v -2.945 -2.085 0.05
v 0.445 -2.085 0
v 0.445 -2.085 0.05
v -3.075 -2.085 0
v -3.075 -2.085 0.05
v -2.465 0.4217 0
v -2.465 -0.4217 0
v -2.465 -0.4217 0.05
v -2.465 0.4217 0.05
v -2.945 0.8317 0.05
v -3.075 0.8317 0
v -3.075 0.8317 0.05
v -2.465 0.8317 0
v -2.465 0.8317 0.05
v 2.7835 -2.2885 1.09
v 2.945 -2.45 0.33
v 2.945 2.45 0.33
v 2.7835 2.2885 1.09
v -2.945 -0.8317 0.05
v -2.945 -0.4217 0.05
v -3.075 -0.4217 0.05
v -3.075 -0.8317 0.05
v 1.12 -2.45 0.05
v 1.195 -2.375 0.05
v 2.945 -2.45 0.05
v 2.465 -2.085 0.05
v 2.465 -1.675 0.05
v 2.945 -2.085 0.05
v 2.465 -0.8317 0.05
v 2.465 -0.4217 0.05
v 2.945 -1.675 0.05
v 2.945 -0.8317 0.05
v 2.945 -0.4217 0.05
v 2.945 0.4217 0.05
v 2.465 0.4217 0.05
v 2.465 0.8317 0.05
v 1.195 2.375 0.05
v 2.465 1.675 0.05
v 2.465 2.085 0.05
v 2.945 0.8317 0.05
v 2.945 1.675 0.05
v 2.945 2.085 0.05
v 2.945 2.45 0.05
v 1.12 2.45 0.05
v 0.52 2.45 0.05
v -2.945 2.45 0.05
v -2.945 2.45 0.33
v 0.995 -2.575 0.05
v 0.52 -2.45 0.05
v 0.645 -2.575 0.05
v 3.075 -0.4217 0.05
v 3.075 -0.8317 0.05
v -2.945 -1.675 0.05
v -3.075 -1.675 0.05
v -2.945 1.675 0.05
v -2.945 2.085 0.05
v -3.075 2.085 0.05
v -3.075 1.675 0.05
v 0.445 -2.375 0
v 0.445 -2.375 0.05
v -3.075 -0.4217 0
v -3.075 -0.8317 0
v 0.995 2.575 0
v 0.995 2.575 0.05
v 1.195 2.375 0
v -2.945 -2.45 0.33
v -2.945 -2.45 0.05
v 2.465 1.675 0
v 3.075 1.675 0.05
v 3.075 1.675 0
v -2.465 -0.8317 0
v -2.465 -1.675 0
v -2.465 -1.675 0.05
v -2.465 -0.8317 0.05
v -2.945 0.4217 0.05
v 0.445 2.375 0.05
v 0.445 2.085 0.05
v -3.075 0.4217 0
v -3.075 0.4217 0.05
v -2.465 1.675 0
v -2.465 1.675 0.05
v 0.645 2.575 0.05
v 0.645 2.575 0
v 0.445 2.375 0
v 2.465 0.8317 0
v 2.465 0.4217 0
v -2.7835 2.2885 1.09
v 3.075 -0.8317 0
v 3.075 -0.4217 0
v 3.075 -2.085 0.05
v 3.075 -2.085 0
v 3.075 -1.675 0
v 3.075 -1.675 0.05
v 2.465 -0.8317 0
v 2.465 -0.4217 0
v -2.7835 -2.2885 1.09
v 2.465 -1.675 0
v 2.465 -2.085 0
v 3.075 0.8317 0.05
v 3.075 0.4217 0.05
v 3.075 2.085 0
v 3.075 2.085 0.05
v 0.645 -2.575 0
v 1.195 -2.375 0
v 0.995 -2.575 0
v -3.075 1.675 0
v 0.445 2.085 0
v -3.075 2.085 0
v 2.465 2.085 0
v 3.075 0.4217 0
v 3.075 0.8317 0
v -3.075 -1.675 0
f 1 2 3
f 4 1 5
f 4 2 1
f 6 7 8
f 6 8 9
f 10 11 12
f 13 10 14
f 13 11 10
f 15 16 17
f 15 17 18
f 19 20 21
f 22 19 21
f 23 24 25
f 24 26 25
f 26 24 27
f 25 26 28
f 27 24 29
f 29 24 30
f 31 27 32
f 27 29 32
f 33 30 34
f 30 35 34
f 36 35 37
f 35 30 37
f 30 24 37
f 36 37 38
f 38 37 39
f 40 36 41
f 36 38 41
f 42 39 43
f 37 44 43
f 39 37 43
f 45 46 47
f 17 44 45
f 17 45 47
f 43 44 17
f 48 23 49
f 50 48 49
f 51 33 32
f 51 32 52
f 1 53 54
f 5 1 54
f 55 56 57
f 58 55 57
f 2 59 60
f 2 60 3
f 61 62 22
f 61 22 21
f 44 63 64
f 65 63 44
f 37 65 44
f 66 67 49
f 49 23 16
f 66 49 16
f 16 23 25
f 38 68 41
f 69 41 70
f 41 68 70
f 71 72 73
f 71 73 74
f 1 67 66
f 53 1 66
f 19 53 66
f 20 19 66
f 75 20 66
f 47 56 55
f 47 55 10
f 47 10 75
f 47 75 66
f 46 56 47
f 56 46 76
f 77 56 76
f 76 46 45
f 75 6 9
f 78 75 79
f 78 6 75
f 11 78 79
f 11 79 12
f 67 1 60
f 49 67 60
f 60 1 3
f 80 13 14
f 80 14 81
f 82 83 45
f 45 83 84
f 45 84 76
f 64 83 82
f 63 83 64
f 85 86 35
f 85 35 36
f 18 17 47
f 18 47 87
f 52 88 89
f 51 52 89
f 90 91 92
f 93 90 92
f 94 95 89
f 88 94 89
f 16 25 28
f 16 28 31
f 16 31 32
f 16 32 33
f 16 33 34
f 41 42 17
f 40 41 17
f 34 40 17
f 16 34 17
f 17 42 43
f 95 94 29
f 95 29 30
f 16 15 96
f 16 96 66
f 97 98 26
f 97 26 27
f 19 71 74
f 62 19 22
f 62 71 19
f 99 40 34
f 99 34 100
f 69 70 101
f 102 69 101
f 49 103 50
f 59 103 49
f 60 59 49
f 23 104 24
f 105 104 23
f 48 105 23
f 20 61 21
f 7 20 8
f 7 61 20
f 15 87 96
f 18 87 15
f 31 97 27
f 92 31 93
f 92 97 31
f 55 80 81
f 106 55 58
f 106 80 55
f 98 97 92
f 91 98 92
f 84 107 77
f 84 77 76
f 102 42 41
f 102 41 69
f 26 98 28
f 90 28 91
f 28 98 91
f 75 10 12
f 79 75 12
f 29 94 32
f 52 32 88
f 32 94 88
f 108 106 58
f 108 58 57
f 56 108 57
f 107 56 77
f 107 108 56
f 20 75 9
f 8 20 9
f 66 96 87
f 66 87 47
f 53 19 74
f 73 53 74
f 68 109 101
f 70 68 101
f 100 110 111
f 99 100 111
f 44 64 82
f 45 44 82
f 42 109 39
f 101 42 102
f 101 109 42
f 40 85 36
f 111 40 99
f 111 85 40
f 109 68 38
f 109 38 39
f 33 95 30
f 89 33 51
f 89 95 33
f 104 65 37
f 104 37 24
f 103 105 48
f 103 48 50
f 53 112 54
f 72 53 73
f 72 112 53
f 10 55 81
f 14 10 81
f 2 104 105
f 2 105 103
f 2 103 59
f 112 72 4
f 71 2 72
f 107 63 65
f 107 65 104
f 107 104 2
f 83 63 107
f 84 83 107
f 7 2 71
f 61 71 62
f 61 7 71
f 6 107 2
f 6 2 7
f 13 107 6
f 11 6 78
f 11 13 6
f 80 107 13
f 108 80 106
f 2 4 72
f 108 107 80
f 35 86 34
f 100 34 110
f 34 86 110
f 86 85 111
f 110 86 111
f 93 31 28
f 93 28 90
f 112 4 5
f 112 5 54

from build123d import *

# Parameters (mm, degrees)
SKETCH001_W     = 5.89
SKETCH001_H     = 4.9
PAD001_DEPTH    = 1.04
POCKET_DEPTH    = 6
POCKET001_DEPTH = 6
SKETCH_W        = 0.61
SKETCH_H        = 0.41
PAD_DEPTH       = 0.05
CHAMFER004_SIZE = 0.2
CHAMFER005_SIZE = 0.2
CHAMFER006_SIZE = 0.2
CHAMFER007_SIZE = 0.2


with BuildPart() as pocket001:
    # Sketch001 → Pad001 (new body)
    with BuildSketch(Plane.XY.offset(0.05)):
        with Locations((3.075, 2.575)):
            Rectangle(SKETCH001_W, SKETCH001_H)
    extrude(amount=PAD001_DEPTH)

    # Sketch002 → Pocket (cut)
    with BuildSketch(Plane(origin=(0, 0.125, 0.05), x_dir=(1, 0, 0), z_dir=(0, -1, 0))):
        Polygon((0.13, 0.28), (0.13, 1.04), (0.291543, 1.04), align=None)
        Polygon((5.858457, 1.04), (6.02, 1.04), (6.02, 0.28), align=None)
    extrude(amount=-POCKET_DEPTH, mode=Mode.SUBTRACT)

    # Sketch003 → Pocket001 (cut)
    with BuildSketch(Plane(origin=(6.02, 0, 0.05), x_dir=(0, 1, 0), z_dir=(1, 0, 0))):
        Polygon((0.125, 0.28), (0.125, 1.04), (0.286543, 1.04), align=None)
        Polygon((4.863457, 1.04), (5.025, 1.04), (5.025, 0.28), align=None)
    extrude(amount=-POCKET001_DEPTH, mode=Mode.SUBTRACT)


with BuildPart() as fusion:
    # Sketch → Pad (new body)
    with BuildSketch(Plane.XY):
        Polygon((3.52, 0), (3.52, 0.49), (0, 0.49), (0, 0.9), (0.61, 0.9), (0.61, 1.743333), (0, 1.743333), (0, 2.153333), (0.61, 2.153333), (0.61, 2.996667), (0, 2.996667), (0, 3.406667), (0.61, 3.406667), (0.61, 4.25), (0, 4.25), (0, 4.66), (3.52, 4.66), (3.52, 5.15), (4.27, 5.15), (4.27, 0), align=None)
        with Locations((5.845, 4.455)):
            Rectangle(SKETCH_W, SKETCH_H)
        with Locations((5.845, 3.201667)):
            Rectangle(SKETCH_W, SKETCH_H)
        with Locations((5.845, 1.948333)):
            Rectangle(SKETCH_W, SKETCH_H)
        with Locations((5.845, 0.695)):
            Rectangle(SKETCH_W, SKETCH_H)
    extrude(amount=PAD_DEPTH)

    # Chamfer004
    chamfer004_edges = [fusion.edges().sort_by_distance(p)[0] for p in [
        (4.27, 0, 0.025),
    ]]
    chamfer(chamfer004_edges, length=CHAMFER004_SIZE)

    # Chamfer005
    chamfer005_edges = [fusion.edges().sort_by_distance(p)[0] for p in [
        (3.52, 0, 0.025),
    ]]
    chamfer(chamfer005_edges, length=CHAMFER005_SIZE)

    # Chamfer006
    chamfer006_edges = [fusion.edges().sort_by_distance(p)[0] for p in [
        (3.52, 5.15, 0.025),
    ]]
    chamfer(chamfer006_edges, length=CHAMFER006_SIZE)

    # Chamfer007
    chamfer007_edges = [fusion.edges().sort_by_distance(p)[0] for p in [
        (4.27, 5.15, 0.025),
    ]]
    chamfer(chamfer007_edges, length=CHAMFER007_SIZE)

    # Fusion: union Pocket001
    add(pocket001.part)


with BuildPart() as fusion_1:
    # Fusion placement: moved
    add(fusion.part.moved(Location((-3.075, -2.575, 0))))


solid = fusion_1.part
